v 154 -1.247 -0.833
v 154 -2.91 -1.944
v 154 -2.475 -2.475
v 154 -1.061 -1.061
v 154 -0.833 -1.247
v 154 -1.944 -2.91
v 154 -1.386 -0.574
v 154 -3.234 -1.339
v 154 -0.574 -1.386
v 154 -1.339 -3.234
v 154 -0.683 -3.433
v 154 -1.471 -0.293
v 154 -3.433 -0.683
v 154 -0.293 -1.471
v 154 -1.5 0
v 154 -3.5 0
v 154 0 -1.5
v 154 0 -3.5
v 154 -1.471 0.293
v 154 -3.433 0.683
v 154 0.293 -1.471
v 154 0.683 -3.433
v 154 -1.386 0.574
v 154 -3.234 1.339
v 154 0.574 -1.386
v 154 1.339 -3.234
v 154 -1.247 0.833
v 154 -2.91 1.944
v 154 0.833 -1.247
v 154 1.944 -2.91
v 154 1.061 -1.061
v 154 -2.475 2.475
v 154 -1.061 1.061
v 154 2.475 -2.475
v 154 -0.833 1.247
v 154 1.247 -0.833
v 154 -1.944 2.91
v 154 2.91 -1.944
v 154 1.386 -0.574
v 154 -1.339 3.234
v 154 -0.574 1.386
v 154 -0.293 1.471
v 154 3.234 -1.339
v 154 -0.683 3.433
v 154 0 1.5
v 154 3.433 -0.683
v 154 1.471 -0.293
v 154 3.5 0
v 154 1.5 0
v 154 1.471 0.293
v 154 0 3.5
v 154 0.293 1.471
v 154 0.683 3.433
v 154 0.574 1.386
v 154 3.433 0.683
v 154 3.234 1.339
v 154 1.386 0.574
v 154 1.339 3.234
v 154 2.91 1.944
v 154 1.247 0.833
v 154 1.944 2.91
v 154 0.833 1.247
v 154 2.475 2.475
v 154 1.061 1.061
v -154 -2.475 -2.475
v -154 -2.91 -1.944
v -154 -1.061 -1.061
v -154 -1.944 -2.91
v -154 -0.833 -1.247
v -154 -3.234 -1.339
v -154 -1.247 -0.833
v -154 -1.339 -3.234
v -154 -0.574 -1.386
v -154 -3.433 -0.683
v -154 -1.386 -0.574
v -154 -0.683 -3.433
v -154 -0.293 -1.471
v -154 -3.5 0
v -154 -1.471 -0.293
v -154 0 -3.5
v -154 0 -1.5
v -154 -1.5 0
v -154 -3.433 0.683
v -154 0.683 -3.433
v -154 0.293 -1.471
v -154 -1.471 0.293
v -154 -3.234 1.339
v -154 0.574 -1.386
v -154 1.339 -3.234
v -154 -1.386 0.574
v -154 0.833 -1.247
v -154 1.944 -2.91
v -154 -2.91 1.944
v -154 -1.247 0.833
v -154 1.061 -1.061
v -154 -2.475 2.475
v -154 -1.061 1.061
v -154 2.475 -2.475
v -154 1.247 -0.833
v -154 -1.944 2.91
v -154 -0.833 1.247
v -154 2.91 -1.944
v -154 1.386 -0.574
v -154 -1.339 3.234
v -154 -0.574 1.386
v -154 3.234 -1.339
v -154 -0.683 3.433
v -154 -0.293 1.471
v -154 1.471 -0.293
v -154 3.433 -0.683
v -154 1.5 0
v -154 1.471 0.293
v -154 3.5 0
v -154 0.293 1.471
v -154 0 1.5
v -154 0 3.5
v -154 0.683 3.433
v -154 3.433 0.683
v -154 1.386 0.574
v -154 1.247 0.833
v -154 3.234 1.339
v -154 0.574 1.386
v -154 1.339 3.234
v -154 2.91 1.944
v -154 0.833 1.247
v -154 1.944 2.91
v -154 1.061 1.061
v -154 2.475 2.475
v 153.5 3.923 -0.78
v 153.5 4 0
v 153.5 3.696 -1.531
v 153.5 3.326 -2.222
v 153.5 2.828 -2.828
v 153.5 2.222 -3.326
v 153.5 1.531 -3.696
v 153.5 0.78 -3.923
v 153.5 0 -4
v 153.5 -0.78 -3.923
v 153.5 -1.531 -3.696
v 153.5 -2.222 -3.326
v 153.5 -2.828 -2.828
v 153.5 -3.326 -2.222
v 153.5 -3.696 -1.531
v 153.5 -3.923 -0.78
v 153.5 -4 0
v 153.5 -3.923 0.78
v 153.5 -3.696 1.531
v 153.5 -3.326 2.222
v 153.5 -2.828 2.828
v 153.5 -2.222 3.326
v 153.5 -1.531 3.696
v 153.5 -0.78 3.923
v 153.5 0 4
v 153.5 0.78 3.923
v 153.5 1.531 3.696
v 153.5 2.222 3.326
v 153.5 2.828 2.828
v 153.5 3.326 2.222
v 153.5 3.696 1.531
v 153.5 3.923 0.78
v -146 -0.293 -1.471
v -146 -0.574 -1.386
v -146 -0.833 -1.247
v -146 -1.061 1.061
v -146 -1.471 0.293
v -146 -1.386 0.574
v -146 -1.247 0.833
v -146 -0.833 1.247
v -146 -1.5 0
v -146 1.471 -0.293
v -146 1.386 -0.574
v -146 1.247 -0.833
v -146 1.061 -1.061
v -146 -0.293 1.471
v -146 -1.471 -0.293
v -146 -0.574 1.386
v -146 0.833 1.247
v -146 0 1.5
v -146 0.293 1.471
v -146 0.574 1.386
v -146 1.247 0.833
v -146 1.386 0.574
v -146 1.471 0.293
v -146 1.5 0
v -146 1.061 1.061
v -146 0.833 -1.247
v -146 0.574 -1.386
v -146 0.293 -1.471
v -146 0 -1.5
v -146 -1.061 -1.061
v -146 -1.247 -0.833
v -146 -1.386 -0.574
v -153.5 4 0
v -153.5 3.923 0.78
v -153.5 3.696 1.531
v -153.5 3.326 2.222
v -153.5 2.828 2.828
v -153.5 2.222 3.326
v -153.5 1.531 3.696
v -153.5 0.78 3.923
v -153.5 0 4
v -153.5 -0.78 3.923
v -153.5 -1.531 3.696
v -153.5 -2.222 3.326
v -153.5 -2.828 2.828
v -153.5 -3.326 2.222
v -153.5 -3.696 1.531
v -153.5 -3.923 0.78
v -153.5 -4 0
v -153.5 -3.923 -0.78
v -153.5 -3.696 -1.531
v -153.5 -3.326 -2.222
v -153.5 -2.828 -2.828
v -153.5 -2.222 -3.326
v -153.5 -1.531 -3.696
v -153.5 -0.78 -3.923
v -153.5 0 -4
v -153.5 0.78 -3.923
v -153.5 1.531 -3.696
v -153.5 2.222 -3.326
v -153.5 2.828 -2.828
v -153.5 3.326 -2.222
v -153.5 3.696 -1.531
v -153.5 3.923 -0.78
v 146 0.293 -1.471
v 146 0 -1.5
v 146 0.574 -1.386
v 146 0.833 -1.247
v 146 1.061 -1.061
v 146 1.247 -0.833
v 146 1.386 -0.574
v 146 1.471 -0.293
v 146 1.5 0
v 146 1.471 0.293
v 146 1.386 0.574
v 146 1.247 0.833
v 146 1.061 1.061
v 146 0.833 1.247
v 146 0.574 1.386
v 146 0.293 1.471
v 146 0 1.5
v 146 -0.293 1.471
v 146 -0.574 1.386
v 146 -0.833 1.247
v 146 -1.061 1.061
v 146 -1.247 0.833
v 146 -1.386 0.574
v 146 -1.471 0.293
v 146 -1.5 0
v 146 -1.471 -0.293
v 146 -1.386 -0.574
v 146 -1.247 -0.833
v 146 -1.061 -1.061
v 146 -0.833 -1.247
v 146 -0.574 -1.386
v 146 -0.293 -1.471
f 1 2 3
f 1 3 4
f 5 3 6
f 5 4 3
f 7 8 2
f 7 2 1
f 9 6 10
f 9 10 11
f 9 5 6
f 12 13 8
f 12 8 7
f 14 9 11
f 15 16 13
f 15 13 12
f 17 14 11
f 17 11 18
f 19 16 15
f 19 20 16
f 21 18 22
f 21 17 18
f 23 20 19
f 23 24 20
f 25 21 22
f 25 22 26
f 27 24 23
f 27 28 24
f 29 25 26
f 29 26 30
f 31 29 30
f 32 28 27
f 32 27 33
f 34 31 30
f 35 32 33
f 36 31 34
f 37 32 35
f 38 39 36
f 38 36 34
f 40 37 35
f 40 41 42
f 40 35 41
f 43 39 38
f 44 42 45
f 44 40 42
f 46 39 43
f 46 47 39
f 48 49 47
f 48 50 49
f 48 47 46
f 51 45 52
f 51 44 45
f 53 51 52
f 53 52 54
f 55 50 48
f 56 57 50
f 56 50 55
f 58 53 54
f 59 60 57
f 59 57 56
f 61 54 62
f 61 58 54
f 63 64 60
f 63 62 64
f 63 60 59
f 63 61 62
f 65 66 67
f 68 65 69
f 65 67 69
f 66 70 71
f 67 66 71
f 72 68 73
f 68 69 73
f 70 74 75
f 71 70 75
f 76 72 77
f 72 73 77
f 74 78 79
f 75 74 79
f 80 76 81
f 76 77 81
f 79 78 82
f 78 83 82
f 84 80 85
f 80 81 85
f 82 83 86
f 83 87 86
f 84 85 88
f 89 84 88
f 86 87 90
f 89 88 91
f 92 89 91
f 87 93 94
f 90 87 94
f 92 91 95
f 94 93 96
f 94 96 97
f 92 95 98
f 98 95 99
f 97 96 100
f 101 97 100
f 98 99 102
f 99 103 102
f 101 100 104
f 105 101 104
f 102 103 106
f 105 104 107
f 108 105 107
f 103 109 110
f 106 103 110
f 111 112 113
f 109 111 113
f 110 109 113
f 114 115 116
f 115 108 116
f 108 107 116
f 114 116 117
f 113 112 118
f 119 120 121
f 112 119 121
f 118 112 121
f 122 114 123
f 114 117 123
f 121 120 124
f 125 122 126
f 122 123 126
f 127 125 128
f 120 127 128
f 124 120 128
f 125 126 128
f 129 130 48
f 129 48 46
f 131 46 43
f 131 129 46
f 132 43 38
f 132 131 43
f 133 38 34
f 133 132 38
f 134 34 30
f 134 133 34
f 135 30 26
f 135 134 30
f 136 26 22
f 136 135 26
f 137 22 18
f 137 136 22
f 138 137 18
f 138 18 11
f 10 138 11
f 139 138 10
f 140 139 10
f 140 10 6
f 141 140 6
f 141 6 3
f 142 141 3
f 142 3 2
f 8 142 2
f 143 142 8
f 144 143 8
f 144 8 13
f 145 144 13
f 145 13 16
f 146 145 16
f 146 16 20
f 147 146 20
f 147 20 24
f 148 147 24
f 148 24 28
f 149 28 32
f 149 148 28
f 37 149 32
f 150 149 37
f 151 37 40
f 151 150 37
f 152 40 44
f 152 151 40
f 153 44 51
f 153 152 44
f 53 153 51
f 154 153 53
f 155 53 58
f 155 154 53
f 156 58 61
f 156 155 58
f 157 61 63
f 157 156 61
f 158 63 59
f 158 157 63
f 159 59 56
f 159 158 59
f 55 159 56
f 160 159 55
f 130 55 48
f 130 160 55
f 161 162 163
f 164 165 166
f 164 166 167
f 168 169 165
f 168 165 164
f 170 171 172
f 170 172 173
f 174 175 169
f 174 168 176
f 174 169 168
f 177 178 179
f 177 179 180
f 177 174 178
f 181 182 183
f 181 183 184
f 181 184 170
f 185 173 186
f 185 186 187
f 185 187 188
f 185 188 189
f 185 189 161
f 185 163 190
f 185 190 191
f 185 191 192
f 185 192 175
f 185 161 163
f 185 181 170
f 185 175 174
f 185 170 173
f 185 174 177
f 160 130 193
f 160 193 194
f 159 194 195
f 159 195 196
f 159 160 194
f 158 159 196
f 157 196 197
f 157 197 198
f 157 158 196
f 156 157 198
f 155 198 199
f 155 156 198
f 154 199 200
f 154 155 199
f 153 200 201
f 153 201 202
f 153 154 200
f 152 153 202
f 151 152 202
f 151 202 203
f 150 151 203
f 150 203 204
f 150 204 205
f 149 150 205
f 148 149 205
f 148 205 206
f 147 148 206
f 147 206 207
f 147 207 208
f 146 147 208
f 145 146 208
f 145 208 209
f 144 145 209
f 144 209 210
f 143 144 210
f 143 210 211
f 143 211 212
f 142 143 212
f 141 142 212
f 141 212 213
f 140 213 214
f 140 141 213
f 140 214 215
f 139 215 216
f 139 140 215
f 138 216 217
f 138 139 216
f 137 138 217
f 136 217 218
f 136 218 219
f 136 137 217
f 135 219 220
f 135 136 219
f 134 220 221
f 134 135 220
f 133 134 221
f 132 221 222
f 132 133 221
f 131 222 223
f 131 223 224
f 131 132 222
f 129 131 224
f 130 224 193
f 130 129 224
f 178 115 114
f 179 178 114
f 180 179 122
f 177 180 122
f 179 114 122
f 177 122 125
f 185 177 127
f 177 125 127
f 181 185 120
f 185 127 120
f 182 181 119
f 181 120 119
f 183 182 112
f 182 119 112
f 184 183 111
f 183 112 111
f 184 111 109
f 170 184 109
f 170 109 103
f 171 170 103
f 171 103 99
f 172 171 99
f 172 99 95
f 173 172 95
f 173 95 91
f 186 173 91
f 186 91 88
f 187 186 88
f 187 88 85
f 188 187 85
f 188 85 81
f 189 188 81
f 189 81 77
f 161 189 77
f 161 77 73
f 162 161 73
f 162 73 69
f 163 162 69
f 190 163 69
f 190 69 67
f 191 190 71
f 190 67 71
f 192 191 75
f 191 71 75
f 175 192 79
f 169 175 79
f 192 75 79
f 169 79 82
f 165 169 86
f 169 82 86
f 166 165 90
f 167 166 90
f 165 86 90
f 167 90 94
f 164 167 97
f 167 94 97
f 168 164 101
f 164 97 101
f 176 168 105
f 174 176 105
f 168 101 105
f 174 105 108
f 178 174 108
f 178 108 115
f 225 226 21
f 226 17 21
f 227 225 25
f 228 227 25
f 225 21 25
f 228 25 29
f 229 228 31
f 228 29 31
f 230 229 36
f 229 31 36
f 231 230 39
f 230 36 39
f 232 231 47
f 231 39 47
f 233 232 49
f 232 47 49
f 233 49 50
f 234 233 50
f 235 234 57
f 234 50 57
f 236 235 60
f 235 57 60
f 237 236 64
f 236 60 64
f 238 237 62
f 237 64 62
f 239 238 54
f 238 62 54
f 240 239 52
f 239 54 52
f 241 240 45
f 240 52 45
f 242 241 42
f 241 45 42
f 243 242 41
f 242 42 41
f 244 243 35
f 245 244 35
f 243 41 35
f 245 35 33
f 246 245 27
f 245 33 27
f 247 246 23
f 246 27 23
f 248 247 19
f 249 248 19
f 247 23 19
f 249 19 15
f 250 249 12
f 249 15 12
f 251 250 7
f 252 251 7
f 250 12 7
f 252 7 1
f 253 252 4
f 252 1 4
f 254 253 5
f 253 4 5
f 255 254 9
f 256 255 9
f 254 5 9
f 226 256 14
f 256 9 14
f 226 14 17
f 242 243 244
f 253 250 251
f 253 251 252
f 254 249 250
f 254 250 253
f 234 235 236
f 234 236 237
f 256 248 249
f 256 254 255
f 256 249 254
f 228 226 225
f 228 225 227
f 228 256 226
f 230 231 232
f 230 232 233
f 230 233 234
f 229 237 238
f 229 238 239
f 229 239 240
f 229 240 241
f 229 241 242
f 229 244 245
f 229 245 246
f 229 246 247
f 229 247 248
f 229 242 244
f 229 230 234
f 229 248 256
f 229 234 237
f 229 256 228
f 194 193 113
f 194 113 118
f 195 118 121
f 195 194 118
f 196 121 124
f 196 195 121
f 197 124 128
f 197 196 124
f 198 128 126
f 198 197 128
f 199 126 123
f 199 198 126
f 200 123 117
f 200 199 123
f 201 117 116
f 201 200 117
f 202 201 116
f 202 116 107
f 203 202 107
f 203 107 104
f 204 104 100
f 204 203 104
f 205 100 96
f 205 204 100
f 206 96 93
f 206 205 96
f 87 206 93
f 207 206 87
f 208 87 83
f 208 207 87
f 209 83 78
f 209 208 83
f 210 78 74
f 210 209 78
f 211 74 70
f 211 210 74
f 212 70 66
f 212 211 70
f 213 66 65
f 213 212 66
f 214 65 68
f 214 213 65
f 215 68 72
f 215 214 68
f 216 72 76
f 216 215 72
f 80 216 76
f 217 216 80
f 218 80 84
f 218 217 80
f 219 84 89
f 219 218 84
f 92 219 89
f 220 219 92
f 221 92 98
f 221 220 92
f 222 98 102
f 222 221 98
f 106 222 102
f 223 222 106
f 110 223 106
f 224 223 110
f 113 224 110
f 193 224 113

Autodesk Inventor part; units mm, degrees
ref_plane "YZ Plane" through (0, 0, 0) normal (1, 0, 0) x (0, 1, 0)
ref_plane "XZ Plane" through (0, 0, 0) normal (0, 1, 0) x (-1, 0, 0)
ref_plane "XY Plane" through (0, 0, 0) normal (0, 0, 1) x (1, 0, 0)
sketch "Эскиз1" plane through (0, 0, 0) normal (1, 0, 0) x (0, 1, 0)
  circle A0 centre (0, 0) radius 4
  circle A1 centre (0, 0) radius 1.5
  dimension "d0" = 8
  dimension "d1" = 3
extrude "Выдавливание1" add sketch "Эскиз1" along normal mid plane 308 contours A0 | A1
sketch "Эскиз2" plane through (154, 0, 0) normal (1, 0, 0) x (0, 0, -1)
  circle A0 centre (0, 0) radius 1.5
  dimension "d4" = 3
extrude "Выдавливание2" cut sketch "Эскиз2" against normal blind 8
sketch "Эскиз3" plane through (-154, 0, 0) normal (-1, 0, 0) x (0, 0, 1)
  circle A0 centre (0, 0) radius 1.5
  dimension "d7" = 3
extrude "Выдавливание3" cut sketch "Эскиз3" against normal blind 8
chamfer "Фаска1" distance 0.5 angle 45 2 edges at (-154, -4, 0) (154, -4, 0)
properties part number "вал 8мм ось x"
